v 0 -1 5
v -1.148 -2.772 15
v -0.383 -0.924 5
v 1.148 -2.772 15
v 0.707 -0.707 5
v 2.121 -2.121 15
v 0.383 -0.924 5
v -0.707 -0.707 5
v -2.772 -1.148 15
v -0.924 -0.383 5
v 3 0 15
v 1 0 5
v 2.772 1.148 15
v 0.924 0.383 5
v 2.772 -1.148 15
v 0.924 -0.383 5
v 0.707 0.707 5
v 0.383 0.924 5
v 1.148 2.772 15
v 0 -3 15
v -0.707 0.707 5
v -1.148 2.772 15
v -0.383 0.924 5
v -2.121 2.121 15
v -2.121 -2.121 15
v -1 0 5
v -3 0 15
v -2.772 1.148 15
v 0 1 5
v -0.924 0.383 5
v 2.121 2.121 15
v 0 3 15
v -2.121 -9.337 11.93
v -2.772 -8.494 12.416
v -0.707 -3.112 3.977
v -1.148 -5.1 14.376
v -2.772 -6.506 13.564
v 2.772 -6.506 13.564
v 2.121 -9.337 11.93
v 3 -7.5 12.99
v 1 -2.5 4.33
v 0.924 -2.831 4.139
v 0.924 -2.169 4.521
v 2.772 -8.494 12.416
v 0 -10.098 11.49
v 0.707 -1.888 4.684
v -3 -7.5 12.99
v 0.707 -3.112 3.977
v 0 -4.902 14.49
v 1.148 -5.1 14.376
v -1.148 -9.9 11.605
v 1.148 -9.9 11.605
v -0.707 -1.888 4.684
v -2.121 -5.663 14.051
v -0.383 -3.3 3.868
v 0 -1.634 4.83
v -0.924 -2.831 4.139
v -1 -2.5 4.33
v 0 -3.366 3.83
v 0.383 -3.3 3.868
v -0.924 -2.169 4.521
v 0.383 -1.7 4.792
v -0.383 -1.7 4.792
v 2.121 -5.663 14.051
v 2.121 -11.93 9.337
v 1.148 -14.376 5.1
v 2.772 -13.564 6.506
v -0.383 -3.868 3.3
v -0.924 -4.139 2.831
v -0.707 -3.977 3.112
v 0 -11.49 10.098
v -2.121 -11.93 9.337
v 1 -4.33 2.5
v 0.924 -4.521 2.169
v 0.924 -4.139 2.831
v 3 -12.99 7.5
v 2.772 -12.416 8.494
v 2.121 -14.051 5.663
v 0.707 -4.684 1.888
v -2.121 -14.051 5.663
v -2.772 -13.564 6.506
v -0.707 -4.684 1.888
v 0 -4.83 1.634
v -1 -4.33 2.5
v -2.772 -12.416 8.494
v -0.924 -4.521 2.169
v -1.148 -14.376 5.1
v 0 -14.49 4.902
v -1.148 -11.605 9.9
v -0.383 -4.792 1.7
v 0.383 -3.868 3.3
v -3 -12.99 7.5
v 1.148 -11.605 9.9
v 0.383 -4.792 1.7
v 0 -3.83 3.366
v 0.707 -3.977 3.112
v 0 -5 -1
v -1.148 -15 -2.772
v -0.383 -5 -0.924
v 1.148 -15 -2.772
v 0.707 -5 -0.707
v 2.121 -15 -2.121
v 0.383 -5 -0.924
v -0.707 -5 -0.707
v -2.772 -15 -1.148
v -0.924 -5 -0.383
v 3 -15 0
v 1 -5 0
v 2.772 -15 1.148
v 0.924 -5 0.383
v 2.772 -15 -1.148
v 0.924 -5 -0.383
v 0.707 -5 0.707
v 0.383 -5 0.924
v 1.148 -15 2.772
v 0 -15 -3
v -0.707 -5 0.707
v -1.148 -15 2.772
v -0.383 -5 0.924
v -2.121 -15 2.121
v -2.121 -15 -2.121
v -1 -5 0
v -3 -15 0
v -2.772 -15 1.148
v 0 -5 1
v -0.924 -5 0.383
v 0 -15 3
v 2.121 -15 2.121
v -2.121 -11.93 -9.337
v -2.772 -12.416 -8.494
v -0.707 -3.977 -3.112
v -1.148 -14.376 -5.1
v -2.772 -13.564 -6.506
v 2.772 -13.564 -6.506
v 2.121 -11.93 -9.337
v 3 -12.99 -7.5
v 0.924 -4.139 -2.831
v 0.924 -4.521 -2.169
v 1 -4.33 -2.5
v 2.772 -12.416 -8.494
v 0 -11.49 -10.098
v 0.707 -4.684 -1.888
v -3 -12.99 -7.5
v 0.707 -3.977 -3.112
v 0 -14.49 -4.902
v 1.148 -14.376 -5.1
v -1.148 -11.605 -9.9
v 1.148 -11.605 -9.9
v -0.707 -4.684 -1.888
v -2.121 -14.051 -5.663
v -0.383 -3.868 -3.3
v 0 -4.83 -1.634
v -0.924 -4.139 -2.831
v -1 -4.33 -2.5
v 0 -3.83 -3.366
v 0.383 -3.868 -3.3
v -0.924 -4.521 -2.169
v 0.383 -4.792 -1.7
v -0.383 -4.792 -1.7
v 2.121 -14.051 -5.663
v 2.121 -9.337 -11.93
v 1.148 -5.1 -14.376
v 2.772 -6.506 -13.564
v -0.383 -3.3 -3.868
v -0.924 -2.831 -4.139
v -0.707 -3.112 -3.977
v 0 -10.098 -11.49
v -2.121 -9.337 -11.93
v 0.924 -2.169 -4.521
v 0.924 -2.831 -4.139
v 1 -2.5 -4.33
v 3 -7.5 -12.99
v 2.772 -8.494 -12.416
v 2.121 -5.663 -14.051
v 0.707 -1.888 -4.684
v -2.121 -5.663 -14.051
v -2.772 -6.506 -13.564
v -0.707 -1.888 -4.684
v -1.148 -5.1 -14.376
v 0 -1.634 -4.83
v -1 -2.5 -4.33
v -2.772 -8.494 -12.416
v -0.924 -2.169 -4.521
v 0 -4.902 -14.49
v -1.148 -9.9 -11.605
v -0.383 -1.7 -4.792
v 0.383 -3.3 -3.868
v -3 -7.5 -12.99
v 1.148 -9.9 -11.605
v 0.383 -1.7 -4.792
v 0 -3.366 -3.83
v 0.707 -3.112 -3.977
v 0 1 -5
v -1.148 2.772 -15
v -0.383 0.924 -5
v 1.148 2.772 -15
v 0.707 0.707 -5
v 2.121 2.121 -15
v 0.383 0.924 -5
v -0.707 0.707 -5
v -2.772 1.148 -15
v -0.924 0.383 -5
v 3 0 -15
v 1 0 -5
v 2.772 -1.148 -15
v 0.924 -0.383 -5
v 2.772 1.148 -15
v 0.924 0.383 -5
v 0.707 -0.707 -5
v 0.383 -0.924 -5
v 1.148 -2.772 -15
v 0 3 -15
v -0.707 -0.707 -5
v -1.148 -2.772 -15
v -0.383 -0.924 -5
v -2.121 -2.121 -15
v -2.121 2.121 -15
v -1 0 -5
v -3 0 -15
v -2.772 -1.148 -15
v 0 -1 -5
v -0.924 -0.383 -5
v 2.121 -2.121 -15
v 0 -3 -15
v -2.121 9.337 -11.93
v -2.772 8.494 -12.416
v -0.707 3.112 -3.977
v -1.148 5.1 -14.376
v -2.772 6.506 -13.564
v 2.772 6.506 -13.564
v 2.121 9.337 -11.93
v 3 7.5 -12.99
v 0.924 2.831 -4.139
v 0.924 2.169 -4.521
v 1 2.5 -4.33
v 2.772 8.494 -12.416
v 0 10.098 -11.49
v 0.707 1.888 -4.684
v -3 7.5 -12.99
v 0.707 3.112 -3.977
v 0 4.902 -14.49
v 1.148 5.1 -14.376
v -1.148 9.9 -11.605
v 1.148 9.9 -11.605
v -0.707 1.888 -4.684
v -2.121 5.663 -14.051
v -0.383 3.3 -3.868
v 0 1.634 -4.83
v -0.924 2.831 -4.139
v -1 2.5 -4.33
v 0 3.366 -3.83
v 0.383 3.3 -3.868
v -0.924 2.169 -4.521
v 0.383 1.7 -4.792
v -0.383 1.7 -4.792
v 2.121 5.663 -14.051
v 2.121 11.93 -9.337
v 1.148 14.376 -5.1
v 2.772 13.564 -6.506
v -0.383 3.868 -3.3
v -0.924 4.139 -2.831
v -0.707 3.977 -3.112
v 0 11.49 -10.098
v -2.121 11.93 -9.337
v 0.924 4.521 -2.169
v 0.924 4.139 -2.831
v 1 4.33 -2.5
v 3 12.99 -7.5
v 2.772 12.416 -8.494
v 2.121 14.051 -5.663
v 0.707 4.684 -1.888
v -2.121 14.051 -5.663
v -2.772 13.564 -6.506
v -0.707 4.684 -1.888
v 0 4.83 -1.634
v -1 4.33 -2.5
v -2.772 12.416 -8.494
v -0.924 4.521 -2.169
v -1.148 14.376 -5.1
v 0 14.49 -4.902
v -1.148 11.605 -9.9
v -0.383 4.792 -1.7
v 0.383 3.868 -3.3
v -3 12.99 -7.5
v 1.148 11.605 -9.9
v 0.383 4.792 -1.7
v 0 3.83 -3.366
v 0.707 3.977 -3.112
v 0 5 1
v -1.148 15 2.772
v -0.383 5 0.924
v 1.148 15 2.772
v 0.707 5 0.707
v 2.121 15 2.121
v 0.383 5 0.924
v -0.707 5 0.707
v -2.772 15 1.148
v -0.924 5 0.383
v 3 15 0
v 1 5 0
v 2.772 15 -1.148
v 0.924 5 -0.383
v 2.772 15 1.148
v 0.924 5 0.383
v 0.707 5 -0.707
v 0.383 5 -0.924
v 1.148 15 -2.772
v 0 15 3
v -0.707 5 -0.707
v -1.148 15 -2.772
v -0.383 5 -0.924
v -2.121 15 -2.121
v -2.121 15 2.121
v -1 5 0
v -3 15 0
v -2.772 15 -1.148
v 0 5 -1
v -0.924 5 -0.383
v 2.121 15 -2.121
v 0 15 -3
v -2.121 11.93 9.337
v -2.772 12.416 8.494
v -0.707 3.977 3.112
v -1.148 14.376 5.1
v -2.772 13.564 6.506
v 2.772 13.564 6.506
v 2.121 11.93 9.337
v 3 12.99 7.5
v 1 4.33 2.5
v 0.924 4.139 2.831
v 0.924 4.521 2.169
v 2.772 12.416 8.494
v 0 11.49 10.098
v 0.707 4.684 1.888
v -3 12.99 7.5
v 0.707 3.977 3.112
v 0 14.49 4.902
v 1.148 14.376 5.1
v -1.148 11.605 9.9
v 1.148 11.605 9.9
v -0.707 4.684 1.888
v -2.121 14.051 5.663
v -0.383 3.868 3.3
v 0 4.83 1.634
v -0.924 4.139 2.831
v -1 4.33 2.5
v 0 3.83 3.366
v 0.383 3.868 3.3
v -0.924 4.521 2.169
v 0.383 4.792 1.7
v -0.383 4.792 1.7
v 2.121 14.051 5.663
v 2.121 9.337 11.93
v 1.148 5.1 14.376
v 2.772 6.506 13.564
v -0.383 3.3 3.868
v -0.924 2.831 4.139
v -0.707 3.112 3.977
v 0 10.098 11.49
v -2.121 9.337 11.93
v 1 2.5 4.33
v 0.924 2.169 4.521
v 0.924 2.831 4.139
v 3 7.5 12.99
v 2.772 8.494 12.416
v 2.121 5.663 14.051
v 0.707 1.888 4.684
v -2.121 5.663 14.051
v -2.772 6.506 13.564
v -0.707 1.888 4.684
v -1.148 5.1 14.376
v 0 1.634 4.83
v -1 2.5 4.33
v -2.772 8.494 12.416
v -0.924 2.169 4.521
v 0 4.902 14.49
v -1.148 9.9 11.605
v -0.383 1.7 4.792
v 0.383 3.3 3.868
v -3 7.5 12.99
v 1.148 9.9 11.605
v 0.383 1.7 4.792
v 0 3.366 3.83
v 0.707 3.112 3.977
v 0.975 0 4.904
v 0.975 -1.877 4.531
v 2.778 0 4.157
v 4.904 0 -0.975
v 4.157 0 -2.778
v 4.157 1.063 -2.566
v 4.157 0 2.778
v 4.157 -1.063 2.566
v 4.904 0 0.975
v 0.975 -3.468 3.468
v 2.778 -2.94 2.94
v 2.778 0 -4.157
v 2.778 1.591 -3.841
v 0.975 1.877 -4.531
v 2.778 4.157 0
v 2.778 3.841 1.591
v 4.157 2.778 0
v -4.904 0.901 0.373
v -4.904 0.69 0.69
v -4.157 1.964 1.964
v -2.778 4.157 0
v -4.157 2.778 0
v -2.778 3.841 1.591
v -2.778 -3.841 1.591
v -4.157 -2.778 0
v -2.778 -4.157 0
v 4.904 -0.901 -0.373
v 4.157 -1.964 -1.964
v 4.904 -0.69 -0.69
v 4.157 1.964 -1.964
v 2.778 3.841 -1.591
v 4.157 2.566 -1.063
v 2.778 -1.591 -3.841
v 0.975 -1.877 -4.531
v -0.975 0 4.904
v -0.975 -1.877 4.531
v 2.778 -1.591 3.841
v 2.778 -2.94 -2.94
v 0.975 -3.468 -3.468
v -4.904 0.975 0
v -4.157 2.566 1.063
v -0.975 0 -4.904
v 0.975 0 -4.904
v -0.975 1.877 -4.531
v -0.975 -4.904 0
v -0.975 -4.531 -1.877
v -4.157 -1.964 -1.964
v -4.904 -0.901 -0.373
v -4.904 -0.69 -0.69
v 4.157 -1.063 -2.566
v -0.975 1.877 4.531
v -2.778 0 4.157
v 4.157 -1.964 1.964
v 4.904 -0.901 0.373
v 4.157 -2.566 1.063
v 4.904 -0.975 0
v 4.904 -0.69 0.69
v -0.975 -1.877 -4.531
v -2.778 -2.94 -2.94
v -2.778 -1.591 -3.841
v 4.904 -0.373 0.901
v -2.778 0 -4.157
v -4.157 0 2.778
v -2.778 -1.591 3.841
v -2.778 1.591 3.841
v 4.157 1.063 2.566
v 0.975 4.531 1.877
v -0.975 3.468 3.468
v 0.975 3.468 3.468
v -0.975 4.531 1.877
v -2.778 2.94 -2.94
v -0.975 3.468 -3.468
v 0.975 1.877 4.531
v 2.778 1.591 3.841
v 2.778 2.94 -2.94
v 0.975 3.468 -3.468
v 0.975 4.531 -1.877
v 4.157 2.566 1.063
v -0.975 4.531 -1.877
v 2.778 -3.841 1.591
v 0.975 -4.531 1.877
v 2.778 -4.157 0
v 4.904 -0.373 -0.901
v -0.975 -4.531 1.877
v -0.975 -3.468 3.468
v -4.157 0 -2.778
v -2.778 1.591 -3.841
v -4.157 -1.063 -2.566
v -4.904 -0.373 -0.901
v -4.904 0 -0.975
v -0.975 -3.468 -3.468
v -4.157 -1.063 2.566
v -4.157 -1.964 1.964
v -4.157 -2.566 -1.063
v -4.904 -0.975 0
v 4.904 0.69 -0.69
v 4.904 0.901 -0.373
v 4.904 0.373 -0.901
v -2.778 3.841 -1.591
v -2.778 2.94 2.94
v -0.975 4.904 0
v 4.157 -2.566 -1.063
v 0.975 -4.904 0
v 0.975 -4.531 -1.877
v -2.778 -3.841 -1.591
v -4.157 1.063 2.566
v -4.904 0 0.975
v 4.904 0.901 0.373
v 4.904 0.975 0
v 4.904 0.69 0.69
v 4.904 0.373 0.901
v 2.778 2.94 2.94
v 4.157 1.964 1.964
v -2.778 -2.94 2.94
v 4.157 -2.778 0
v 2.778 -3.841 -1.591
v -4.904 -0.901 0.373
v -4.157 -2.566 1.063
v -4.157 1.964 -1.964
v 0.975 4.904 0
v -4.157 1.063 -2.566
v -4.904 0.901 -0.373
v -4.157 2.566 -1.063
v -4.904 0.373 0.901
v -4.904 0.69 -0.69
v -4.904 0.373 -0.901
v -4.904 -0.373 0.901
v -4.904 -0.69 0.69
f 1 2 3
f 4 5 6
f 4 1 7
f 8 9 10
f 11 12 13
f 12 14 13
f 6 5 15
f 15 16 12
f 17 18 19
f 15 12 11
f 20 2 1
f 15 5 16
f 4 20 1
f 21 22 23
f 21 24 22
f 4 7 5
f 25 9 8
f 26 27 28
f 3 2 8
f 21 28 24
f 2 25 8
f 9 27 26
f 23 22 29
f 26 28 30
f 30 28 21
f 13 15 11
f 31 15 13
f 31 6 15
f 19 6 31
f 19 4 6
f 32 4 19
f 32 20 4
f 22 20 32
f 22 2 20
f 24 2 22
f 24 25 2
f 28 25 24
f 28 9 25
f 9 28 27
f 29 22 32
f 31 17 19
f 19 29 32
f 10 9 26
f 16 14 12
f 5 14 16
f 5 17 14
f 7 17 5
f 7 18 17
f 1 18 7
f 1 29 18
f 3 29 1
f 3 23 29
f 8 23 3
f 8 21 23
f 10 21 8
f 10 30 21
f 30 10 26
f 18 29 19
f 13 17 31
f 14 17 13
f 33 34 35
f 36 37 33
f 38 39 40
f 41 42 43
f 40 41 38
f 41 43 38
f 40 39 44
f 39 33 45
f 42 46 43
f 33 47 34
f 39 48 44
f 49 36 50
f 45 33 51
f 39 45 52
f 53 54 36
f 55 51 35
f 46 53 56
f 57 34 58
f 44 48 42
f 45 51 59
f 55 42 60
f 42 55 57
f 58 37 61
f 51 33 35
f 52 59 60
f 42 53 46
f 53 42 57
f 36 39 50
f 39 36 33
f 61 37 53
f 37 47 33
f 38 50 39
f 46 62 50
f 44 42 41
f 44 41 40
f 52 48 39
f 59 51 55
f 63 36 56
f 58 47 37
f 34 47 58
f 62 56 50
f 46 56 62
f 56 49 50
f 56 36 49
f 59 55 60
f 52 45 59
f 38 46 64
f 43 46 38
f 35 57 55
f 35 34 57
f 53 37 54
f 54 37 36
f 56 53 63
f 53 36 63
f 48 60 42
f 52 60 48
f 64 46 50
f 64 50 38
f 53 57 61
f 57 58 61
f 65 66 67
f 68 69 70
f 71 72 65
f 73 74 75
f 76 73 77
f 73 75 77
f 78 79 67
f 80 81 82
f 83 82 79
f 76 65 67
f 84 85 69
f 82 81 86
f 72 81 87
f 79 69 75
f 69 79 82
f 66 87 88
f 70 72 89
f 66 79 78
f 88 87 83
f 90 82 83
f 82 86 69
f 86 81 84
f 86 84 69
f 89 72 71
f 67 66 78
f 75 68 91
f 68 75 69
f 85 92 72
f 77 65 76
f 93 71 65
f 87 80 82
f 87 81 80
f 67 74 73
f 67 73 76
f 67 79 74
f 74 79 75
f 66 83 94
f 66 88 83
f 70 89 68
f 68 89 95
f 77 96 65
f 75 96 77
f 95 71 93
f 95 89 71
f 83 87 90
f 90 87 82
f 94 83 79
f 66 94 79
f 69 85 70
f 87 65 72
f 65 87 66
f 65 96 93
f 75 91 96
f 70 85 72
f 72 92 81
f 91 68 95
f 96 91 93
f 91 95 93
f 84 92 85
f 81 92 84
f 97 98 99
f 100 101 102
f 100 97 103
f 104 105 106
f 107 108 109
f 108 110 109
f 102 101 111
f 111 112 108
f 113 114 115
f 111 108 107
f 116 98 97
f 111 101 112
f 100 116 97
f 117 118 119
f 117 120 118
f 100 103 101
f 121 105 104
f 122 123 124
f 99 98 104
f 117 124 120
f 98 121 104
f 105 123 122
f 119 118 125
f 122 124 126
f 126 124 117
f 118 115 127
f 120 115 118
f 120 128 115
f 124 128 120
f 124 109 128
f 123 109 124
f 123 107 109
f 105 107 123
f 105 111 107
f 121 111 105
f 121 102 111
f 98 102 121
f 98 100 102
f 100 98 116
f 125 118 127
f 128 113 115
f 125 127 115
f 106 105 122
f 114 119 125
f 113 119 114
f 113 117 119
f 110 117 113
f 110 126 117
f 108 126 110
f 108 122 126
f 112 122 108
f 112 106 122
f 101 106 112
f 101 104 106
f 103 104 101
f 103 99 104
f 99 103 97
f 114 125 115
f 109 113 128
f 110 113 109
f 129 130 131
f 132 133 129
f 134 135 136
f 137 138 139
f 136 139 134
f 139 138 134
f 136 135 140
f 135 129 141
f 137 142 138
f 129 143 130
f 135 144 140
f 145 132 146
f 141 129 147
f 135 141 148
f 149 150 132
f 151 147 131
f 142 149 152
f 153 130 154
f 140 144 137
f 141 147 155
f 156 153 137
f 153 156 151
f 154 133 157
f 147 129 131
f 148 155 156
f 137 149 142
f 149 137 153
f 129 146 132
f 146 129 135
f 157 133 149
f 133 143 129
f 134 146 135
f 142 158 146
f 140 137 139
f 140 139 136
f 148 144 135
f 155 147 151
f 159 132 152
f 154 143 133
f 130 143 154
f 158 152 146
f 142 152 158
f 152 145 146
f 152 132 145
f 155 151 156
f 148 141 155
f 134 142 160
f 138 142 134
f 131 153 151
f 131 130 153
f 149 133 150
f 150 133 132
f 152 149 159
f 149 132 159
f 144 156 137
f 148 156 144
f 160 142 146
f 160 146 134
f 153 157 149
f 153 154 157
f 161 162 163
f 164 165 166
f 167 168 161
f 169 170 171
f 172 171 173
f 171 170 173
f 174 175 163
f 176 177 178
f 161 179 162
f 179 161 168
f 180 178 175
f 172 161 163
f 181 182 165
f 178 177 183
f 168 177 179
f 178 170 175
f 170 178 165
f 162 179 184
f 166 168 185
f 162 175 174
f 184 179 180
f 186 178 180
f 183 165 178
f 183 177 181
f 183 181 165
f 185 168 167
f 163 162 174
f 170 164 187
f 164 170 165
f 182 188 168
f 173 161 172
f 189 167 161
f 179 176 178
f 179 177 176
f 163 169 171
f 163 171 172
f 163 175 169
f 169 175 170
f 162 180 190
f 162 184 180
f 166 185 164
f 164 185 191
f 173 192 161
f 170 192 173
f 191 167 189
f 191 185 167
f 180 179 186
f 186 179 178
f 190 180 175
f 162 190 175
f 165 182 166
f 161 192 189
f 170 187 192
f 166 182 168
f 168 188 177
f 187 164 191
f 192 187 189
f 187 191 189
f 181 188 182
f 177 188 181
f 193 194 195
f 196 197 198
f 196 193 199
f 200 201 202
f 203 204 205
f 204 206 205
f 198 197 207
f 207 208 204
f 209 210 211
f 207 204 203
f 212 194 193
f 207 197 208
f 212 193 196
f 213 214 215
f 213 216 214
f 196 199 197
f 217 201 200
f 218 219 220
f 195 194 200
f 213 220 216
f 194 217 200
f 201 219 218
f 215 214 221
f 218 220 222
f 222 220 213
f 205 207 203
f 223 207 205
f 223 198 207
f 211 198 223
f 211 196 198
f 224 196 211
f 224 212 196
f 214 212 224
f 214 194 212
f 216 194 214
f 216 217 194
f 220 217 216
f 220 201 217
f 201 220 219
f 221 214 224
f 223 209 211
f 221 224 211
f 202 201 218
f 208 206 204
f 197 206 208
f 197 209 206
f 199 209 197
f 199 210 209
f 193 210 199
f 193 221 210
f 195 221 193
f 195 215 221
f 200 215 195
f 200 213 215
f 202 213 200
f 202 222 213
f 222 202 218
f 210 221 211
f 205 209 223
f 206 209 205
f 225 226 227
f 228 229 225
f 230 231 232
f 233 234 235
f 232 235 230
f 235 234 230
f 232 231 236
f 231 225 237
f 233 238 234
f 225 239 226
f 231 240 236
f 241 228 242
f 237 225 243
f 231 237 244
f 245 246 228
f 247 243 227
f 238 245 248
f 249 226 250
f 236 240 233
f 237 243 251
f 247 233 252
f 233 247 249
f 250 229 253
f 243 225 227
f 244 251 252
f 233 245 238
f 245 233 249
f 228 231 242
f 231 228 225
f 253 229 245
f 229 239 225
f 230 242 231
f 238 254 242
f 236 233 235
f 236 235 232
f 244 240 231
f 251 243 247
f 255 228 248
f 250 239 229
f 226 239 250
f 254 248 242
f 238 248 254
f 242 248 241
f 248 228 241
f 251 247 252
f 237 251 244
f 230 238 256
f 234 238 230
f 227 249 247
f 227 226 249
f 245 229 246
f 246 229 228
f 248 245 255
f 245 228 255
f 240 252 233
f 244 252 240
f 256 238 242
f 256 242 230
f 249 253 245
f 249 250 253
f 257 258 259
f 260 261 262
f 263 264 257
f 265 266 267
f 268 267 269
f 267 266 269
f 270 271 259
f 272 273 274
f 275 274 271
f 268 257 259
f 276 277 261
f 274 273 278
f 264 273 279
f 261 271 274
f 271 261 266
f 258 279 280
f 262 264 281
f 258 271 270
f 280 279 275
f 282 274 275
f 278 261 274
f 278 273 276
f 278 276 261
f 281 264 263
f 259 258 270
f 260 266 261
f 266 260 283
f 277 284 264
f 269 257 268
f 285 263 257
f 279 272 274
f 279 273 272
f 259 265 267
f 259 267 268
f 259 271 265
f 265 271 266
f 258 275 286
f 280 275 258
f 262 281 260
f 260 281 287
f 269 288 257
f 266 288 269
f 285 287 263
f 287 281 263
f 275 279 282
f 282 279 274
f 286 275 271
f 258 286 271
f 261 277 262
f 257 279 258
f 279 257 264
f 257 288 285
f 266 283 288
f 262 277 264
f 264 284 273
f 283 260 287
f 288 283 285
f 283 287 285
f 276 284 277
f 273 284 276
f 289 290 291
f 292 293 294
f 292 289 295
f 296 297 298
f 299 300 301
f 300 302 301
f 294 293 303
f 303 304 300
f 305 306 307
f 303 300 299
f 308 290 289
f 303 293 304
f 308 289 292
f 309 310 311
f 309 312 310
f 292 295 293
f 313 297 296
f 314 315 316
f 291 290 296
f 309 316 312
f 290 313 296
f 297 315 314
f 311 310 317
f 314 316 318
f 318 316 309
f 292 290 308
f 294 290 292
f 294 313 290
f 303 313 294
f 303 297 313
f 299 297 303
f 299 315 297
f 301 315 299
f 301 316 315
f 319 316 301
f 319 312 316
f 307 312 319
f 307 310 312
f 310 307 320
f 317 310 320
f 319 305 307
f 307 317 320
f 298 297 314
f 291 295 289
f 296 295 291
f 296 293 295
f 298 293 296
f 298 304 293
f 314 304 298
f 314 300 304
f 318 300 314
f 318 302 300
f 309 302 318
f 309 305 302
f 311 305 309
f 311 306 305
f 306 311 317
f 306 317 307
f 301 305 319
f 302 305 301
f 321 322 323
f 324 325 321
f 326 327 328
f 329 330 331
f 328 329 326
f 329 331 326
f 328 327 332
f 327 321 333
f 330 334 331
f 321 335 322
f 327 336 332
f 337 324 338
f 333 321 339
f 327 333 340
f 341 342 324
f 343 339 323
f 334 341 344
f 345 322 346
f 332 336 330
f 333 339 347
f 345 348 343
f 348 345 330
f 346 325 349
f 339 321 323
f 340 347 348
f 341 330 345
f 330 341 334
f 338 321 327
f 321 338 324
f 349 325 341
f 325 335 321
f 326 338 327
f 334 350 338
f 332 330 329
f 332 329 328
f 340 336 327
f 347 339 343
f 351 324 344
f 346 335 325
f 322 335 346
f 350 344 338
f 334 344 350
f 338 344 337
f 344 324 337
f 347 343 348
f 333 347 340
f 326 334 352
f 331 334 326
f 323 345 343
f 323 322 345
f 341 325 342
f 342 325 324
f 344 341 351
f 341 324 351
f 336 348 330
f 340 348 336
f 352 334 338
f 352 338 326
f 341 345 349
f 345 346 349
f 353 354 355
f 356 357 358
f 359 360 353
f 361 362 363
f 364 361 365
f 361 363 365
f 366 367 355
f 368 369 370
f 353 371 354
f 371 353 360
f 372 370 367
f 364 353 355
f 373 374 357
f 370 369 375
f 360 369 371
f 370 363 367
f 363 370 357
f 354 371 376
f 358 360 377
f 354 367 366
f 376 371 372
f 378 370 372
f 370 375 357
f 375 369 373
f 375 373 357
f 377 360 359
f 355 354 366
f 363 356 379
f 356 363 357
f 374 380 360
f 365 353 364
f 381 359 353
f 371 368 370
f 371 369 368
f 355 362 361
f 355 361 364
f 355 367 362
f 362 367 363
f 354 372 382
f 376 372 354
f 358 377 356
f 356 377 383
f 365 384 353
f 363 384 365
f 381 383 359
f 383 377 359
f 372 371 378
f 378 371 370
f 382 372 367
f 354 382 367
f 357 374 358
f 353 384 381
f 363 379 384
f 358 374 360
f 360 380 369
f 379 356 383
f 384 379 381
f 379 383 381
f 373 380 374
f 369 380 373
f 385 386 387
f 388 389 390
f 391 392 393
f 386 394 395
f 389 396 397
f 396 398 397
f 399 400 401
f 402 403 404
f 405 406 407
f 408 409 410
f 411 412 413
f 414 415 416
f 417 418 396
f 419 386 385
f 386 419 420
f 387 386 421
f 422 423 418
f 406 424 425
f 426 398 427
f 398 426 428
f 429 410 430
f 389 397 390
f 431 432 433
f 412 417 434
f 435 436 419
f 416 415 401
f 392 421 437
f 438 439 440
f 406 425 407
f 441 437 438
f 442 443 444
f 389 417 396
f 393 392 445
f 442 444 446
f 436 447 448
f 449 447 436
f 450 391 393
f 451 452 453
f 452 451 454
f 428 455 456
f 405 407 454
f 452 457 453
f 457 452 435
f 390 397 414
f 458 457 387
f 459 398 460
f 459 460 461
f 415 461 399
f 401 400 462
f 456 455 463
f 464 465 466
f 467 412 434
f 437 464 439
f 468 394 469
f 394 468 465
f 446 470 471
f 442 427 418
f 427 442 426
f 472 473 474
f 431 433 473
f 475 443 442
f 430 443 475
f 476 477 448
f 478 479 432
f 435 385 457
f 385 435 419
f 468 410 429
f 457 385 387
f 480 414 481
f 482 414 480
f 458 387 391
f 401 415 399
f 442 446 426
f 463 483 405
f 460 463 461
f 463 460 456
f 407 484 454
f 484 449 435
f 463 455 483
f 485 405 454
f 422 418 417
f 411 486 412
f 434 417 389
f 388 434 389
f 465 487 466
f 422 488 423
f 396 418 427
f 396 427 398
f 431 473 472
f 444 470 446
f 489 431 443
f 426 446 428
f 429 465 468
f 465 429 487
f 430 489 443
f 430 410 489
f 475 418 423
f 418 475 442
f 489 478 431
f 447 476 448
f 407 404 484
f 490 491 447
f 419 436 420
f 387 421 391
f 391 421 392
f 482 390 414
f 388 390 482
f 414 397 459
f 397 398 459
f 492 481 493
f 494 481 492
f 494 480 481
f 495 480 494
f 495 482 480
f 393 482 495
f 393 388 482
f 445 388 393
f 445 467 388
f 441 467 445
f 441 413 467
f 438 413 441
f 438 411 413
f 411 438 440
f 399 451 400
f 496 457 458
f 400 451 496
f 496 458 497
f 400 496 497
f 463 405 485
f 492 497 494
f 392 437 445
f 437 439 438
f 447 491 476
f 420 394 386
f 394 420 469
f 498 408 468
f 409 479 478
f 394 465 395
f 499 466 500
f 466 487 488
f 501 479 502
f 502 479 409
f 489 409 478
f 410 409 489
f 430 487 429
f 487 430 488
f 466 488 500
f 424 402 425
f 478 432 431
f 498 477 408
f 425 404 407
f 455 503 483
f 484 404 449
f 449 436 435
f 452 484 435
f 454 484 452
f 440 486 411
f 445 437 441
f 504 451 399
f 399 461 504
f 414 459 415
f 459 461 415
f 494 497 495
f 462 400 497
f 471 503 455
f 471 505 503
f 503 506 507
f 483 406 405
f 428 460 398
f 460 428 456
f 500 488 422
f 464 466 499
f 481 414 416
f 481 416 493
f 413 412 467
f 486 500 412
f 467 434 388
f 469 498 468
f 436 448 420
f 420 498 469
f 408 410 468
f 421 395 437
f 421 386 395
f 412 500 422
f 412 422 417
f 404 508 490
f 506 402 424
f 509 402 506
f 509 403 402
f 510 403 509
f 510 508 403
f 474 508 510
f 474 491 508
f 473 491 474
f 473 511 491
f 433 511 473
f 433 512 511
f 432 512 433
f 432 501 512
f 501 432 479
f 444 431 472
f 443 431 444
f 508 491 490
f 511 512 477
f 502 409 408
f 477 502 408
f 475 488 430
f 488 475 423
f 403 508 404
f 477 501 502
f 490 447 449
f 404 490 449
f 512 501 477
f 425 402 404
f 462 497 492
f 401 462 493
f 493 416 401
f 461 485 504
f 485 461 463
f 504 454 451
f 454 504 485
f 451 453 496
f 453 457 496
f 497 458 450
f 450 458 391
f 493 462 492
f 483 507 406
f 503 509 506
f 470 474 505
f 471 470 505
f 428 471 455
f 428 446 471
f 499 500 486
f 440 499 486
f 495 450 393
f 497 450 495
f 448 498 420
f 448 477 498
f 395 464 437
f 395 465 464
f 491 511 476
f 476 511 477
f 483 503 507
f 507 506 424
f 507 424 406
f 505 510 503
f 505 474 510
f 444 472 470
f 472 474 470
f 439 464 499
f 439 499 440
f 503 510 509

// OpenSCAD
$fn = 32;

color("#AA5566")

rotate(a=90, v=[0,1,0])

sphere(5);

$fn = 16;

for (i = [0:30:330]){
	bob =  str("#55",str(i%101),str(i%101));
	echo(bob);
	color(bob)

	rotate(a=i,v=[1,0,0])
	translate([0,0,5])
	cylinder(h=10, r1=1, r2 = 3);

}
